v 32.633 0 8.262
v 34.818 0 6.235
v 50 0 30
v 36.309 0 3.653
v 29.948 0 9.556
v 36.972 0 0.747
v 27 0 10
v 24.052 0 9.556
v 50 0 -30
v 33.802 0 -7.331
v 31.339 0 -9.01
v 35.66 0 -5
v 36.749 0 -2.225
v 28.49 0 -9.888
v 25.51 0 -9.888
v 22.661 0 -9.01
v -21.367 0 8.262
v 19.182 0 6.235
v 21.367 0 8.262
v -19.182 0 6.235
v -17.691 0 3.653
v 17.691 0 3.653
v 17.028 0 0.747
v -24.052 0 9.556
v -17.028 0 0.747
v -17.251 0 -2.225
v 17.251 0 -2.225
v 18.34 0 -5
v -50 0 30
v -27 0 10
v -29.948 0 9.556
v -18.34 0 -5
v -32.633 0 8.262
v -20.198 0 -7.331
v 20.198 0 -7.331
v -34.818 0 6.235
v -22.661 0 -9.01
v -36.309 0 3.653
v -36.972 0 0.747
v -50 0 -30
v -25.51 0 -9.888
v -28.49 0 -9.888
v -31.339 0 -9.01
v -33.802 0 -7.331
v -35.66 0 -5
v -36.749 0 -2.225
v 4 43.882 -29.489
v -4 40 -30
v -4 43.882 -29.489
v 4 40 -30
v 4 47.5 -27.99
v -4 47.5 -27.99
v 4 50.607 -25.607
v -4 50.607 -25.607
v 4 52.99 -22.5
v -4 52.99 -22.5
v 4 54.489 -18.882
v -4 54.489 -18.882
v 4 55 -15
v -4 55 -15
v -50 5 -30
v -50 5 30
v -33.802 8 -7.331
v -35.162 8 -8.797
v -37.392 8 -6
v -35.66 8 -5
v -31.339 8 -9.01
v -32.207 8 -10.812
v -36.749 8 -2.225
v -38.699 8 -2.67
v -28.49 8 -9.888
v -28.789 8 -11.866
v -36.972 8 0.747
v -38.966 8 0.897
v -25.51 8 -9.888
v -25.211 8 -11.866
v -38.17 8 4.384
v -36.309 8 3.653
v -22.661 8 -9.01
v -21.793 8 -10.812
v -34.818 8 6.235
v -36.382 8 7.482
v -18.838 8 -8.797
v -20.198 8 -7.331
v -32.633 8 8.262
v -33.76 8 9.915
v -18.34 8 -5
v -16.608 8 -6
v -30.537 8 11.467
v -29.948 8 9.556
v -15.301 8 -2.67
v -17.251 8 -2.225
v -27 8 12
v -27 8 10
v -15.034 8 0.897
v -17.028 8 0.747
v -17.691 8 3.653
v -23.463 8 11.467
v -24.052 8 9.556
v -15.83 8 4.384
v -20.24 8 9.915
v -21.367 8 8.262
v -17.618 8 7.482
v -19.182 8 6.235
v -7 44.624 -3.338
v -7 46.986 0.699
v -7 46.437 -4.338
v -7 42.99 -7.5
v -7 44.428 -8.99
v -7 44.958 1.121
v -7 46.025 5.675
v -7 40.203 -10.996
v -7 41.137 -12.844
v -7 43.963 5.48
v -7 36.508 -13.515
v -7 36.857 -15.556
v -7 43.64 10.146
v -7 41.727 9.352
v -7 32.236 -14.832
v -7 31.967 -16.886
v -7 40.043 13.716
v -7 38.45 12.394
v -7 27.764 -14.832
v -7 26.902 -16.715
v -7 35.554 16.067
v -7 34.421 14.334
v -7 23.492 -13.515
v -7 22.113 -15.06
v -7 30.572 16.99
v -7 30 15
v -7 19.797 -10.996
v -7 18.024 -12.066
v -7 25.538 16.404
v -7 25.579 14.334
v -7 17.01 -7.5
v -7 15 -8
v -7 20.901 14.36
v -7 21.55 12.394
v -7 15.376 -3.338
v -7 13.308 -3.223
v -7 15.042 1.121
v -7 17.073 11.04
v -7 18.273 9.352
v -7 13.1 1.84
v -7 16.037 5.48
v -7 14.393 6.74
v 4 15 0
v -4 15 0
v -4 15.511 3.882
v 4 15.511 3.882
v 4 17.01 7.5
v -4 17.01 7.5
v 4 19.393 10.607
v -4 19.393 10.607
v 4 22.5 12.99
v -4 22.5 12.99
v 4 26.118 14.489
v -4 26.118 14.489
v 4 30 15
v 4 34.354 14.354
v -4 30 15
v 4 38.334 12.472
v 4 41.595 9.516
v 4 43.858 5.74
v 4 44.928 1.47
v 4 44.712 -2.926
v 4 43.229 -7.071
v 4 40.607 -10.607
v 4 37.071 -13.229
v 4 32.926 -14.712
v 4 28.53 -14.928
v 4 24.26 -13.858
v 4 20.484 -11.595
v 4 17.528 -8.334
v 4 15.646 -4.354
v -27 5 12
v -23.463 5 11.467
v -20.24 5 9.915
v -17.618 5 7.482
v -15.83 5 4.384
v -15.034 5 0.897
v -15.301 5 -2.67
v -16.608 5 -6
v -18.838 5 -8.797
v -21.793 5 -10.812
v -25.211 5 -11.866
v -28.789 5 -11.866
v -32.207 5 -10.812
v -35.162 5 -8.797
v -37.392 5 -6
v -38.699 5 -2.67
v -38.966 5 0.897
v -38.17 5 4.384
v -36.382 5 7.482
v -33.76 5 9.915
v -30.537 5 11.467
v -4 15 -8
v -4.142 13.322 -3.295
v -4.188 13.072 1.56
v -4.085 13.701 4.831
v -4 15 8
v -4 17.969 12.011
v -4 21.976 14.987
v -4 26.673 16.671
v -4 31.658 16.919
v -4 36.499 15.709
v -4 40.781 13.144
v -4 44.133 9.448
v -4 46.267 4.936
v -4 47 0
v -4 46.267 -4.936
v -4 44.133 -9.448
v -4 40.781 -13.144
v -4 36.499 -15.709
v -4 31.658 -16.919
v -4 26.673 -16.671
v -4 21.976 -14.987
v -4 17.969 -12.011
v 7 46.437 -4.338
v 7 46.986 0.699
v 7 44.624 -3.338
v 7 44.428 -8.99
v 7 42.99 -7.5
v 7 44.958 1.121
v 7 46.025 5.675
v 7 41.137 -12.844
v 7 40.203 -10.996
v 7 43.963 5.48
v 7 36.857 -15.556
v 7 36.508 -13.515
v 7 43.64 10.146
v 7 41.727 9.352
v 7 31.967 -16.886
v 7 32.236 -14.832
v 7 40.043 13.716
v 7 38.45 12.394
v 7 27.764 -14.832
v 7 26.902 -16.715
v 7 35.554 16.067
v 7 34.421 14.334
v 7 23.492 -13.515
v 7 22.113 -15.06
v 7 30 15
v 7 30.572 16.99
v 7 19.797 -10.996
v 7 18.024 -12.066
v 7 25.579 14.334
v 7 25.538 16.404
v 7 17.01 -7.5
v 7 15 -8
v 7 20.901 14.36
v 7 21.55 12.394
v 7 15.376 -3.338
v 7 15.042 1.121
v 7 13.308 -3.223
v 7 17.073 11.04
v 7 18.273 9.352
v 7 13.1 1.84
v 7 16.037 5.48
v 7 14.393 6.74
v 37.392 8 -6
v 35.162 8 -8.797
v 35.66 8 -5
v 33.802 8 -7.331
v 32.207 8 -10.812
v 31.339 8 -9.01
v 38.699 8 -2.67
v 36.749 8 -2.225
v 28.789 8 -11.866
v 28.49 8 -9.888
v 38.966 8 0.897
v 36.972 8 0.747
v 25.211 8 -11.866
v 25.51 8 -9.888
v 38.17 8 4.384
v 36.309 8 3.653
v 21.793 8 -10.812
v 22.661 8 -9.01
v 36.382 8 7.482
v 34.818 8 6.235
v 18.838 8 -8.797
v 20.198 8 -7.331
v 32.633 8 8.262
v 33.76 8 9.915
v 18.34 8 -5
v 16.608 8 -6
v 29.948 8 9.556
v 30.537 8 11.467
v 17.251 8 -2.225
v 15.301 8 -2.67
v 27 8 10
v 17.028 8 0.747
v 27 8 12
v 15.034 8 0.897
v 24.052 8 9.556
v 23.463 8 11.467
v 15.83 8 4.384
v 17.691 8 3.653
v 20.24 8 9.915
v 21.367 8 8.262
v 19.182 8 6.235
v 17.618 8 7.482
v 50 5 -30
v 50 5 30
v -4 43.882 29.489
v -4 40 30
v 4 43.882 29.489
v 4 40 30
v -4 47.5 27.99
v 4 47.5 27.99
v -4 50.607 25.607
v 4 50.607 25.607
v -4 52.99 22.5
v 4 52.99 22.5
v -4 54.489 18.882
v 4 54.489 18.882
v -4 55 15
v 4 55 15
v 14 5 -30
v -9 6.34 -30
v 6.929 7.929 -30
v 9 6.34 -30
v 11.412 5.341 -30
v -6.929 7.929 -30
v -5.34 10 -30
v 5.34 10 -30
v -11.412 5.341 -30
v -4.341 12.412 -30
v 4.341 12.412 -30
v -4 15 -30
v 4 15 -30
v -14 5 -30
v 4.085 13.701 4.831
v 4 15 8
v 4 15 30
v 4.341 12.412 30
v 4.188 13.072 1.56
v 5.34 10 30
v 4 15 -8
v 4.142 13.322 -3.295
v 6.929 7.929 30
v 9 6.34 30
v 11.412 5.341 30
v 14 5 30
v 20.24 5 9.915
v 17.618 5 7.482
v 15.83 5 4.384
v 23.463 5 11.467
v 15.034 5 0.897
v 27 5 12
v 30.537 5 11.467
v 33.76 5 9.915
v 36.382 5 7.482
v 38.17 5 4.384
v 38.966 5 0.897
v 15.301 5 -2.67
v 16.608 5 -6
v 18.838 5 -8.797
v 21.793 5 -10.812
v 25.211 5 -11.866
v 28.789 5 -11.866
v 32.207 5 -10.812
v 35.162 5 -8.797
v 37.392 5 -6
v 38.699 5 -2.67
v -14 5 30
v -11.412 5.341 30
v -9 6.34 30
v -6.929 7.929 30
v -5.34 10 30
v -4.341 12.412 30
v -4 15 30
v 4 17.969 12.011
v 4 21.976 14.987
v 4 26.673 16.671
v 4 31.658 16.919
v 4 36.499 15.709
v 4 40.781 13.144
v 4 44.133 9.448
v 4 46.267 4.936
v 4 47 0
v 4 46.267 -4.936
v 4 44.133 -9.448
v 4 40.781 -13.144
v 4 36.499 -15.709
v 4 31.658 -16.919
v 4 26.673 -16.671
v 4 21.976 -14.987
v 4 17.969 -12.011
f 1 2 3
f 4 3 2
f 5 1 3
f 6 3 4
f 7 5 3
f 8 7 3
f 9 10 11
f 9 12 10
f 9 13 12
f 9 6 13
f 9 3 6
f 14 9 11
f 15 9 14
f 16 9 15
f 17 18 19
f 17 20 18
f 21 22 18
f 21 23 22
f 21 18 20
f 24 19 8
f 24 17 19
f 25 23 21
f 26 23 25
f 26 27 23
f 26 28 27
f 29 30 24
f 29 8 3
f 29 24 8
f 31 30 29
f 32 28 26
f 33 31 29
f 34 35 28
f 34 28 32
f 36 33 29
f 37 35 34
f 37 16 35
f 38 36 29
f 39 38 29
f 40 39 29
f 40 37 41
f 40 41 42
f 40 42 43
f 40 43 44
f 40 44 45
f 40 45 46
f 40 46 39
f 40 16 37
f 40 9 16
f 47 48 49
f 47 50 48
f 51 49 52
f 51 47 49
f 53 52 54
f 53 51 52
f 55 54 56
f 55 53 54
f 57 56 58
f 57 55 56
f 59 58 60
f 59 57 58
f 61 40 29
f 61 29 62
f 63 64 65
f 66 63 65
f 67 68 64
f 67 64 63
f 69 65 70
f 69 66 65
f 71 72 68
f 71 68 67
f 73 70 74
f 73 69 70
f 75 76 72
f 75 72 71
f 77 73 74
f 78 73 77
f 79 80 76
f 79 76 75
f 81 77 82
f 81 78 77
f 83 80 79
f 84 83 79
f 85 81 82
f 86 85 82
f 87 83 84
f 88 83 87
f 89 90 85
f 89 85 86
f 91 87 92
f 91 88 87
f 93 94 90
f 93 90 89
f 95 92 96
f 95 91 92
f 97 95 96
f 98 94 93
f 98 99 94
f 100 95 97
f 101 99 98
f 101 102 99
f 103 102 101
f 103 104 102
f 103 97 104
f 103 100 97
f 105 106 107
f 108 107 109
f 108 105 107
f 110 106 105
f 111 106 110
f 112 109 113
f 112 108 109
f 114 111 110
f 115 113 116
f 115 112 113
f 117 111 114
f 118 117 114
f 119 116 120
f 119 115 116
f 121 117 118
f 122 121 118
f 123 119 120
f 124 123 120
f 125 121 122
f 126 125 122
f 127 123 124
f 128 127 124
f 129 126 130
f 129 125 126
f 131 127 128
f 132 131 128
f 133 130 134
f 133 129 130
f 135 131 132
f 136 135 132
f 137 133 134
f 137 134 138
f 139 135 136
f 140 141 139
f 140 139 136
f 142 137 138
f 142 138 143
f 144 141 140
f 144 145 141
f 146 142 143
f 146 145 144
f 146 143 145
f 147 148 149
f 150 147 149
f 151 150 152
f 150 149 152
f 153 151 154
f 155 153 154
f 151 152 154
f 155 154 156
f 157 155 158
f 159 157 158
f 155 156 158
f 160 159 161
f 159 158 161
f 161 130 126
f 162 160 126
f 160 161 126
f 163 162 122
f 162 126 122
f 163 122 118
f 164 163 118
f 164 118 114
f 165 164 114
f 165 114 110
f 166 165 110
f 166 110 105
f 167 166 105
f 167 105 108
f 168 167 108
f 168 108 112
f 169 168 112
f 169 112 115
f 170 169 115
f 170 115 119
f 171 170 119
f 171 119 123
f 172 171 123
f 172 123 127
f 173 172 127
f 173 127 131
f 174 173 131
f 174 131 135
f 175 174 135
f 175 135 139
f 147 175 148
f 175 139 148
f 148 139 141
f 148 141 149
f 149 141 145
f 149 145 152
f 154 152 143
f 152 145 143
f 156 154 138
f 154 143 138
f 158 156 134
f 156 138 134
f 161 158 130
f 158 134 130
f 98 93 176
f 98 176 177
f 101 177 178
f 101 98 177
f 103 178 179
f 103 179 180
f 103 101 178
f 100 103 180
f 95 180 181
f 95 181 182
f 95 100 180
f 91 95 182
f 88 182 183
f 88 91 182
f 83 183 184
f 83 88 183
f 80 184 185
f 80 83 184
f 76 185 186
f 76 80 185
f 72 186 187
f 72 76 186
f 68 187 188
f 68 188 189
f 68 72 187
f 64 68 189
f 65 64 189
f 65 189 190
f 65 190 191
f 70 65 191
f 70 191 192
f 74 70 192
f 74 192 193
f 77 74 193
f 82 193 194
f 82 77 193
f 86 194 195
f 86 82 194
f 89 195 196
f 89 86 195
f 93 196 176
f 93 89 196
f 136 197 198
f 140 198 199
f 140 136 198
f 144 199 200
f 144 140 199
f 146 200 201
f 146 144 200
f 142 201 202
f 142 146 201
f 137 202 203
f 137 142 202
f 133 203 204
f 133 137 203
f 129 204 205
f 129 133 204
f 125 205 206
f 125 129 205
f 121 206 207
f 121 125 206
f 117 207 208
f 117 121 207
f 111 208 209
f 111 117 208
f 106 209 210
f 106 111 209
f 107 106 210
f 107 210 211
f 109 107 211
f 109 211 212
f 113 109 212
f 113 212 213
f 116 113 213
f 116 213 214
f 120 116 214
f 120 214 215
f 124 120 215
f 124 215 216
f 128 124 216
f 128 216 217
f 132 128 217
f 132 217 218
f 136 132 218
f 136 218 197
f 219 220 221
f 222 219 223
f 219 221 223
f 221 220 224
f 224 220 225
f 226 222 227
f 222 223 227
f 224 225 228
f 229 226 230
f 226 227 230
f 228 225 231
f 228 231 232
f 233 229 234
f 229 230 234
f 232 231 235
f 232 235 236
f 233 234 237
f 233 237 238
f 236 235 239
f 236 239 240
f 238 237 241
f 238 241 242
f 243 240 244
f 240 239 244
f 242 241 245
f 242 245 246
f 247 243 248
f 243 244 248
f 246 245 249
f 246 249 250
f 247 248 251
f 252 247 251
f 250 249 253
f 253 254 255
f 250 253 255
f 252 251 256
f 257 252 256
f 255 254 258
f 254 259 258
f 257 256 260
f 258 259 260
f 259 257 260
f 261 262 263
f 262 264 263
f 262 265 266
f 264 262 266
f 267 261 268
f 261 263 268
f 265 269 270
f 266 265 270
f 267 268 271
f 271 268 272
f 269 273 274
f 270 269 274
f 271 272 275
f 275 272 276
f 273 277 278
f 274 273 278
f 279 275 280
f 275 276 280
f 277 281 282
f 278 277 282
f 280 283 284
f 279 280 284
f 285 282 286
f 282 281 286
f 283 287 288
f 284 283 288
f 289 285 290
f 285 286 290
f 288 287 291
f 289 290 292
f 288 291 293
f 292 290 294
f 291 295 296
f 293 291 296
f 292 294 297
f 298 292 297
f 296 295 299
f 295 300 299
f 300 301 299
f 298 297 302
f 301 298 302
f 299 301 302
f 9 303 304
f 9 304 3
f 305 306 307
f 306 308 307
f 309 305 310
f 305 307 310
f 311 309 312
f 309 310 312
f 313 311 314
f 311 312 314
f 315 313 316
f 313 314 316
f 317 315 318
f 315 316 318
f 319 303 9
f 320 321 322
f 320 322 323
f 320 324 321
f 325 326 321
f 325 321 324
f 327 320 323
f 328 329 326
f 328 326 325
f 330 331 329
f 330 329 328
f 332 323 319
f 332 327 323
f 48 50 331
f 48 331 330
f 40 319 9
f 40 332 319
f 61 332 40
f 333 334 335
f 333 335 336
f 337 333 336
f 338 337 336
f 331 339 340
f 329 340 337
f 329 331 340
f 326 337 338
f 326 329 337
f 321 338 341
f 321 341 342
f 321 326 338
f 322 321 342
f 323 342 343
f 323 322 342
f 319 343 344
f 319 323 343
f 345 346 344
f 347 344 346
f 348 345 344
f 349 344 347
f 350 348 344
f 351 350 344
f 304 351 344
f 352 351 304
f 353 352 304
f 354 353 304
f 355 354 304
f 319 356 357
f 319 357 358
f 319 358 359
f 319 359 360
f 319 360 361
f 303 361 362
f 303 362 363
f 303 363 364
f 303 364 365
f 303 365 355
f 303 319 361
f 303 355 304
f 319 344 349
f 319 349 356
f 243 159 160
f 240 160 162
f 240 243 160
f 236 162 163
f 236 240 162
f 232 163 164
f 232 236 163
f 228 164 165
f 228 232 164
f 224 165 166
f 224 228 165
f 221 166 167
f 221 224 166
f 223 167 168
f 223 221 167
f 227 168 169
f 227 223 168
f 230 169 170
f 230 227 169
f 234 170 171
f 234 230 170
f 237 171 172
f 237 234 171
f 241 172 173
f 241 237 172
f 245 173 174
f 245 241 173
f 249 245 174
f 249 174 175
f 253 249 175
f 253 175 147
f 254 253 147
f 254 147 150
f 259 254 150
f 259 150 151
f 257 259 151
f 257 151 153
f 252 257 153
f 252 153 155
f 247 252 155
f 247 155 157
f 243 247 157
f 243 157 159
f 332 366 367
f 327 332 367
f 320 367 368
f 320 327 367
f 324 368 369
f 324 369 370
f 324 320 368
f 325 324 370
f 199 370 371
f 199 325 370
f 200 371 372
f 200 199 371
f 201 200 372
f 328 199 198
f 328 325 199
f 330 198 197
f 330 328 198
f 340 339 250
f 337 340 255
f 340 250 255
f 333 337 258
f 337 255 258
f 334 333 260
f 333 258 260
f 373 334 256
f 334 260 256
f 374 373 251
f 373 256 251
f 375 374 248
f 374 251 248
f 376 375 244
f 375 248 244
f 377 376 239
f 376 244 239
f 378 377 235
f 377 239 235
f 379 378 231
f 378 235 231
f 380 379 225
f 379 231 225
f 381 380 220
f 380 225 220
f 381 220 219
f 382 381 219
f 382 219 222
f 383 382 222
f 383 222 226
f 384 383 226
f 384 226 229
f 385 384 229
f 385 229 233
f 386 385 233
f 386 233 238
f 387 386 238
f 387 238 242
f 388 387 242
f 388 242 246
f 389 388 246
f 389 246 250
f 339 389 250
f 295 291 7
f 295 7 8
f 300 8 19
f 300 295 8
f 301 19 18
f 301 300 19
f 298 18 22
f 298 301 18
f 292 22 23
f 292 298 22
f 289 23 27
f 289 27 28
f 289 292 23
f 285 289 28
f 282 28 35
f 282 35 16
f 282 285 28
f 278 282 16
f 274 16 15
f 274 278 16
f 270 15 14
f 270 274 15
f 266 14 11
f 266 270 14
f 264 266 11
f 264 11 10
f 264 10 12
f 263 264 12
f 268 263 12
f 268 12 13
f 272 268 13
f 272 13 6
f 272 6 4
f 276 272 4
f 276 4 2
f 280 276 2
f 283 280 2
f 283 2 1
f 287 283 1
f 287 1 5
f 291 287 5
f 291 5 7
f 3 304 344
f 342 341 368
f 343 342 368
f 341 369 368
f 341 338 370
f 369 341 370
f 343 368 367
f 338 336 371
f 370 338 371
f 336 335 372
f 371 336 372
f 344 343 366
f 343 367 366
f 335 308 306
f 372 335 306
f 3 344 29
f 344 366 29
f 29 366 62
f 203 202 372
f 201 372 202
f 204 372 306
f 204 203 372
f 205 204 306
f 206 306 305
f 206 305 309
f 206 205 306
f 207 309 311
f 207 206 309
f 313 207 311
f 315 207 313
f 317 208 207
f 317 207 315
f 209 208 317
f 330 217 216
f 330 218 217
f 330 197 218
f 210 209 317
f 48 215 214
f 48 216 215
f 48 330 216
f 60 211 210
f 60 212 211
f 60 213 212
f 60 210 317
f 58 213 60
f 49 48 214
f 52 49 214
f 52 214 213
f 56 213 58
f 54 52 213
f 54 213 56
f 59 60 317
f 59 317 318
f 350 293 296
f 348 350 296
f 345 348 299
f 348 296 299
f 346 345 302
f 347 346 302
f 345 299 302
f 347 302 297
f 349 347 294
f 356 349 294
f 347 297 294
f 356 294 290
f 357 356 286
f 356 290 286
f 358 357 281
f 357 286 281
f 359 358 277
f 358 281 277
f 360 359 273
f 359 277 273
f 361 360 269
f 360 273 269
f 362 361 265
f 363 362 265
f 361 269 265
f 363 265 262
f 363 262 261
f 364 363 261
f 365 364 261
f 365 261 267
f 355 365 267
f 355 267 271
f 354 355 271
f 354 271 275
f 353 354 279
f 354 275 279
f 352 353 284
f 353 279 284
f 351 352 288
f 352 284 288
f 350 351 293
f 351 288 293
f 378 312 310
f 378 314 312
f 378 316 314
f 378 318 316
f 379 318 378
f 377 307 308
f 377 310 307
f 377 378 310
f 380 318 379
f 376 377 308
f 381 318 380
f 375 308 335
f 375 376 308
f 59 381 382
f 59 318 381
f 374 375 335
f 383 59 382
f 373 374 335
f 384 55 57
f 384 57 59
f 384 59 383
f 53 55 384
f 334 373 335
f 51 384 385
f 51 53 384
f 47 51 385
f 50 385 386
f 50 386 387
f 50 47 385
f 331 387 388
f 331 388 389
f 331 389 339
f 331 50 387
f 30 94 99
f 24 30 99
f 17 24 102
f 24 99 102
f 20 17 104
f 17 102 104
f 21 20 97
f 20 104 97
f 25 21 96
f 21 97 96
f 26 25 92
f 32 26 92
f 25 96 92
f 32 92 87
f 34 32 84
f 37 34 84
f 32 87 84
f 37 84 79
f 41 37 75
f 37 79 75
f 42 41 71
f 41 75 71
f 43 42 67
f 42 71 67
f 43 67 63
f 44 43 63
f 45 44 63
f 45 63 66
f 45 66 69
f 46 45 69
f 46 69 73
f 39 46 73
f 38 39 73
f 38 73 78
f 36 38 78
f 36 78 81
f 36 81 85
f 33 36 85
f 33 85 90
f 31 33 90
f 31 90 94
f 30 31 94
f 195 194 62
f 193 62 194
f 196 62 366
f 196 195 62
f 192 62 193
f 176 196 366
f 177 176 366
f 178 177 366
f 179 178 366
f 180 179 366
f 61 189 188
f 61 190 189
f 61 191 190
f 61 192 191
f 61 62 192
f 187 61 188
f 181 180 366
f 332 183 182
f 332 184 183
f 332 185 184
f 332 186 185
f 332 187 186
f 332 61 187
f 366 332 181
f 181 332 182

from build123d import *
from build123d.topology import SkipClean

# Parameters (mm, degrees)
BOSS_EXTRUDE1_DEPTH      = 30
BOSS_EXTRUDE1_DEPTH_BACK = 30
SKETCH2_R                = 10
CUT_EXTRUDE1_DEPTH       = 5
BOSS_EXTRUDE2_START      = 3
SKETCH2_3_R              = 12
SKETCH2_3_R_2            = 10
BOSS_EXTRUDE2_DEPTH      = 3
SKETCH3_R                = 15
CUT_EXTRUDE2_DEPTH       = 8
BOSS_EXTRUDE3_START      = 3
SKETCH3_3_R              = 17
SKETCH3_3_R_2            = 15
BOSS_EXTRUDE3_DEPTH      = 3
FILLET1_R                = 15


with BuildPart() as part:
    # Sketch1 → Boss-Extrude1 (new, two sides: drawn at the far end of the back side and taken through both)
    with BuildSketch(Plane.XY.offset(-BOSS_EXTRUDE1_DEPTH_BACK)):
        with BuildLine():
            Line((50, 0), (-50, 0))
            Line((-50, 0), (-50, 5))
            Line((-50, 5), (-14, 5))
            ThreePointArc((-14, 5), (-6.928932188, 7.928932188), (-4, 15))
            Line((-4, 15), (-4, 55))
            Line((-4, 55), (4, 55))
            Line((4, 55), (4, 15))
            ThreePointArc((4, 15), (6.928932188, 7.928932188), (14, 5))
            Line((14, 5), (50, 5))
            Line((50, 5), (50, 0))
        make_face()
    extrude(amount=BOSS_EXTRUDE1_DEPTH + BOSS_EXTRUDE1_DEPTH_BACK)

    # Sketch2 → Cut-Extrude1 (cut)
    with BuildSketch(Plane(origin=(0, 5, 0), x_dir=(1, 0, 0), z_dir=(0, 1, 0))):
        with Locations(Location((-27, 0, 0), (0, 0, 270))):
            Circle(SKETCH2_R)
    cut_extrude1 = extrude(amount=-CUT_EXTRUDE1_DEPTH, mode=Mode.SUBTRACT)

    # Sketch2<3> → Boss-Extrude2 (add)
    with BuildSketch(Plane(origin=(0, 5, 0), x_dir=(1, 0, 0), z_dir=(0, 1, 0)).offset(BOSS_EXTRUDE2_START)):
        with Locations(Location((-27, 0, 0), (0, 0, 270))):
            Circle(SKETCH2_3_R)
        with Locations(Location((-27, 0, 0), (0, 0, 270))):
            Circle(SKETCH2_3_R_2, mode=Mode.SUBTRACT)
    boss_extrude2 = extrude(amount=-BOSS_EXTRUDE2_DEPTH)

    # Mirror1: Cut-Extrude1, Boss-Extrude2 across plane
    add(cut_extrude1.mirror(Plane(origin=(0, 0, 0), x_dir=(0, 0, 1), z_dir=(1, 0, 0))), mode=Mode.SUBTRACT)
    add(boss_extrude2.mirror(Plane(origin=(0, 0, 0), x_dir=(0, 0, 1), z_dir=(1, 0, 0))))

    # Sketch3 → Cut-Extrude2 (cut)
    with BuildSketch(Plane.ZY.offset(4)):
        with Locations(Location((0, 30, 0), (0, 0, 270))):
            Circle(SKETCH3_R)
    extrude(amount=-CUT_EXTRUDE2_DEPTH, mode=Mode.SUBTRACT)

    # Sketch3<3> → Boss-Extrude3 (add)
    with BuildSketch(Plane.ZY.offset(4).offset(BOSS_EXTRUDE3_START)):
        with Locations(Location((0, 30, 0), (0, 0, 241.927513064))):
            Circle(SKETCH3_3_R)
        with Locations((0, 30)):
            Circle(SKETCH3_3_R_2, mode=Mode.SUBTRACT)
    boss_extrude3 = extrude(amount=-BOSS_EXTRUDE3_DEPTH)

    # Mirror2: Boss-Extrude3 across plane
    with SkipClean():  # the faces are left unmerged after this step: merging them gives an invalid solid
        add(boss_extrude3.mirror(Plane(origin=(0, 0, 0), x_dir=(0, 0, 1), z_dir=(1, 0, 0))))

    # Fillet1
    fillet1_edges = [part.edges().sort_by_distance(p)[0] for p in [
        (0, 55, -30),
        (0, 55, 30),
    ]]
    fillet(fillet1_edges, radius=FILLET1_R)


solid = part.part
